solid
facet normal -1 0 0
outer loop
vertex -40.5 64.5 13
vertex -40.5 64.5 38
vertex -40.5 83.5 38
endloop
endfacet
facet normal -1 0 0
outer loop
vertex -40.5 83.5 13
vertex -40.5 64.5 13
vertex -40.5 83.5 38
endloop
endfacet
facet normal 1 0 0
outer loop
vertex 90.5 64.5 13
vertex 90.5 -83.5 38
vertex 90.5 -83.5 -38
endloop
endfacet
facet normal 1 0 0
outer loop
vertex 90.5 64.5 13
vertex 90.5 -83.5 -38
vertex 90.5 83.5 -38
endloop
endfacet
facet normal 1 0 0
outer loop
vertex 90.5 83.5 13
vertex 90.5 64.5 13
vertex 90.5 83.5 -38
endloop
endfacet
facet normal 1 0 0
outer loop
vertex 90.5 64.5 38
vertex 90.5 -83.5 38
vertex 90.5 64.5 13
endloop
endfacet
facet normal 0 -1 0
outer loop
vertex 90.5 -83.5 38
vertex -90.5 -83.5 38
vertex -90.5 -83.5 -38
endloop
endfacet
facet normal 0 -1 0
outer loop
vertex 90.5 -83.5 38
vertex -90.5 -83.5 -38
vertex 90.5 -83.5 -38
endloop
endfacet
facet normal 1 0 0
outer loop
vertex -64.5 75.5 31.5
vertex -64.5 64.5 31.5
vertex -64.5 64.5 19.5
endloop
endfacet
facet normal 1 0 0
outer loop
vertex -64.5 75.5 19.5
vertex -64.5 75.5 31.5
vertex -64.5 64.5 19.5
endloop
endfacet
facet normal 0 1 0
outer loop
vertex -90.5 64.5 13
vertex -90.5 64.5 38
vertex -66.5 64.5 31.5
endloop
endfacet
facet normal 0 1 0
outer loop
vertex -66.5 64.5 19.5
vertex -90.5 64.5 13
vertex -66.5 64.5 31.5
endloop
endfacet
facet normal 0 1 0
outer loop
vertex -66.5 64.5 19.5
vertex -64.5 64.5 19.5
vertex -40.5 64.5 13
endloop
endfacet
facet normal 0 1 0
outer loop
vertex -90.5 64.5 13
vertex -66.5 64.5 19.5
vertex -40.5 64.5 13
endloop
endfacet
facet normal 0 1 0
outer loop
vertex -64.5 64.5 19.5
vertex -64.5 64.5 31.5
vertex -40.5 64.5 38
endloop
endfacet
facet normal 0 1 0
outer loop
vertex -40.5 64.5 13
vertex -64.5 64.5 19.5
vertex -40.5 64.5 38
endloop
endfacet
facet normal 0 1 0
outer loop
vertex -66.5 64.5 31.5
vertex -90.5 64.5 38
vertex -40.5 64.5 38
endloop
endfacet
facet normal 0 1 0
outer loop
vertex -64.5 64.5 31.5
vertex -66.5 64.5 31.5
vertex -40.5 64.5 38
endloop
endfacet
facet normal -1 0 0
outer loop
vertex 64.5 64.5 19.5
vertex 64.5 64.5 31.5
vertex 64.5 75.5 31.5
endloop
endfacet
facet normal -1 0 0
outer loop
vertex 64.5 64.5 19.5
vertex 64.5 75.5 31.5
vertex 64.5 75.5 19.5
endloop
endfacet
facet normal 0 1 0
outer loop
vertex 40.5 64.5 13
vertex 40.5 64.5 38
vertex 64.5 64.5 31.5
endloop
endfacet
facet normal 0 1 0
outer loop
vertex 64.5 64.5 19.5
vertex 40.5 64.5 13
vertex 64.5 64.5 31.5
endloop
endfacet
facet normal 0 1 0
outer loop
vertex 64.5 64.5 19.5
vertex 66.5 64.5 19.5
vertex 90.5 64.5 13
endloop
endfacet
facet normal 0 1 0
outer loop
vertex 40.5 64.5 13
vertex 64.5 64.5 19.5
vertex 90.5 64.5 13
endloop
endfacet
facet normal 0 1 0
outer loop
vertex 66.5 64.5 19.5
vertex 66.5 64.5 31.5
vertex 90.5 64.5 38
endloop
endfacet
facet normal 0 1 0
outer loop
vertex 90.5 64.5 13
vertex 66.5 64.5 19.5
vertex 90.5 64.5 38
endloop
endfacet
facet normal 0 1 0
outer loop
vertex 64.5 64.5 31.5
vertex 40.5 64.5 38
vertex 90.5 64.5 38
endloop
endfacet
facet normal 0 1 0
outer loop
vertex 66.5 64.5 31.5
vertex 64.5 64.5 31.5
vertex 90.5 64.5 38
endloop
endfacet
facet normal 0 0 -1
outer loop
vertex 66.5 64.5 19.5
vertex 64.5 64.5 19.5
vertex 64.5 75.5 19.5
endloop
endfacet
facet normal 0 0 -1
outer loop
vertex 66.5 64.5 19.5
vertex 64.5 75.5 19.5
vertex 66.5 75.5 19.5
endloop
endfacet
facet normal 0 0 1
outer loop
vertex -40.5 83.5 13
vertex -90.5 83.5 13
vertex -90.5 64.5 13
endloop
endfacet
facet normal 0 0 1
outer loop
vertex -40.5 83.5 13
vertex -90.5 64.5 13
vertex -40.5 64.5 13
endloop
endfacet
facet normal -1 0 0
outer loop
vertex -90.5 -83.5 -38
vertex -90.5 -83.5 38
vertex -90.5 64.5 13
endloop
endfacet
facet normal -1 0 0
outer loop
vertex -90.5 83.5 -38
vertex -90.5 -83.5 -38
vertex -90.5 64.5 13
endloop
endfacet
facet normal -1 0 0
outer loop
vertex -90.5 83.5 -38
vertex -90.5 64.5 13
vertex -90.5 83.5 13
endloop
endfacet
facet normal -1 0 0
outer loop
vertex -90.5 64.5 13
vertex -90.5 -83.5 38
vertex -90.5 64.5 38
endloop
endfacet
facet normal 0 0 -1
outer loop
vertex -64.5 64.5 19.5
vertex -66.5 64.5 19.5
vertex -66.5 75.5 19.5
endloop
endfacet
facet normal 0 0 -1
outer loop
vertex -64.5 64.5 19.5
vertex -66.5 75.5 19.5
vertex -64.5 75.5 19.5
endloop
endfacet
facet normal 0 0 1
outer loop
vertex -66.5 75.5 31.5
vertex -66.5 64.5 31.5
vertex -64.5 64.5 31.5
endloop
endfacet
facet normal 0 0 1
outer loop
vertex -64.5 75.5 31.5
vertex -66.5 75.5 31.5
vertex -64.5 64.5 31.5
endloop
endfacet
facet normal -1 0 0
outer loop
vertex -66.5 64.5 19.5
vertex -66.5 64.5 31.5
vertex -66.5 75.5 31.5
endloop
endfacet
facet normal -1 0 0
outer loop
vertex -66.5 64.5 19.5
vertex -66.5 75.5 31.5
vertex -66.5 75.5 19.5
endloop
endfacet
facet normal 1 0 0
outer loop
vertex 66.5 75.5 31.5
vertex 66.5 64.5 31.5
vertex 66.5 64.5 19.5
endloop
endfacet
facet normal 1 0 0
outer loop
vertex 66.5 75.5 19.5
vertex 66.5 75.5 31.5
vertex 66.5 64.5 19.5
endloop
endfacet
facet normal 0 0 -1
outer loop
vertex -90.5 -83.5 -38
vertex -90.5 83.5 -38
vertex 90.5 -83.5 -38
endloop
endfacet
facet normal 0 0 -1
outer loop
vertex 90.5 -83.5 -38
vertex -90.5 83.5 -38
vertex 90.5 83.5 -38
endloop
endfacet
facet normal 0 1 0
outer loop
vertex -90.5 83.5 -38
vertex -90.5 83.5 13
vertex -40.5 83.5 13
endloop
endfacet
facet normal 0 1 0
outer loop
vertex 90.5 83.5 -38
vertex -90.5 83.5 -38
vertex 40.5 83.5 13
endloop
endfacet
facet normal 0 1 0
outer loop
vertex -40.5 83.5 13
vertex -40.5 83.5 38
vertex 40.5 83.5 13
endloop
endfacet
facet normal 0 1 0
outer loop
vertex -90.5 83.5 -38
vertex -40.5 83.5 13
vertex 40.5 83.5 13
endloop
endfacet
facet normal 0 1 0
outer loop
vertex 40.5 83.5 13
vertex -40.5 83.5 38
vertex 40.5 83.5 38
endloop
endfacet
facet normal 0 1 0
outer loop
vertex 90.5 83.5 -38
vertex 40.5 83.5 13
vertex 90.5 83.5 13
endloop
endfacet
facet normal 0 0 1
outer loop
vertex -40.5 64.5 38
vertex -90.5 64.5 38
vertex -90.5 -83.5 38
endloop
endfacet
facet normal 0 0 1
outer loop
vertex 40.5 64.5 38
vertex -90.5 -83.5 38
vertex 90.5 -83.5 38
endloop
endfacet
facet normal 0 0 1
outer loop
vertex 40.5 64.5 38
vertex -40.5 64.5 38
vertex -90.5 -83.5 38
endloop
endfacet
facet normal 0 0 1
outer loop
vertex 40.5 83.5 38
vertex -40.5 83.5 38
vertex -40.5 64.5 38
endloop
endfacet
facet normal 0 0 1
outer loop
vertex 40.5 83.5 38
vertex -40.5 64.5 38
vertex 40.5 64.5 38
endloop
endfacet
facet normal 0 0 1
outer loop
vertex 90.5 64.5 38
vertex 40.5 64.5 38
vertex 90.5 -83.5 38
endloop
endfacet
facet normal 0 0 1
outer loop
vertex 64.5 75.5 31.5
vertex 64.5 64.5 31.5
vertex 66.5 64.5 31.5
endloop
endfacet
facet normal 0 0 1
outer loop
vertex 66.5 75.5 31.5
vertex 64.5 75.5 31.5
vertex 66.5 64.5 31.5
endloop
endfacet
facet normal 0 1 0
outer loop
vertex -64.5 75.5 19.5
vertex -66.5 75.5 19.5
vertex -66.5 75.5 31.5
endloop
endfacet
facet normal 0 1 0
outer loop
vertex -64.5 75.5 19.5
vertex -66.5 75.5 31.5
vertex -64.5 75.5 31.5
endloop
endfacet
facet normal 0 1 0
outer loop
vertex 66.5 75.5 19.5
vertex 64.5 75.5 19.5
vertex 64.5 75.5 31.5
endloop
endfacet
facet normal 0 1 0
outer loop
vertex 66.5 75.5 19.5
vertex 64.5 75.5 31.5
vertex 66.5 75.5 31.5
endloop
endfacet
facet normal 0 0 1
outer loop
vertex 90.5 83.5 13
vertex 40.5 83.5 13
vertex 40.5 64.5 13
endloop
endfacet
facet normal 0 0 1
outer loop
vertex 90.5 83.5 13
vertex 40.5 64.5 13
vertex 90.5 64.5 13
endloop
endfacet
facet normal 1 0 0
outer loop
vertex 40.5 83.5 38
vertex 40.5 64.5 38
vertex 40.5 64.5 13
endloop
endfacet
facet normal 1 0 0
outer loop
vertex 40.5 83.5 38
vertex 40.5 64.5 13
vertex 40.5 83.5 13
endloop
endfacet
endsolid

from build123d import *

# Parameters (mm, degrees)
SKETCH1_W           = 181
SKETCH1_H           = 167
BOSS_EXTRUDE1_DEPTH = 38
SKETCH3_W           = 50
SKETCH3_H           = 19
CUT_EXTRUDE1_DEPTH  = 25
SKETCH4_W           = 2
SKETCH4_H           = 12
BOSS_EXTRUDE2_DEPTH = 11


with BuildPart() as part:
    # Sketch1 → Boss-Extrude1 (new body, symmetric)
    with BuildSketch(Plane.XY):
        Rectangle(SKETCH1_W, SKETCH1_H)
    extrude(amount=BOSS_EXTRUDE1_DEPTH, both=True)

    # Sketch3 → Cut-Extrude1 (cut)
    with BuildSketch(Plane.XY.offset(38)):
        with Locations((-65.5, 74)):
            Rectangle(SKETCH3_W, SKETCH3_H)
        with Locations((65.5, 74)):
            Rectangle(SKETCH3_W, SKETCH3_H)
    extrude(amount=-CUT_EXTRUDE1_DEPTH, mode=Mode.SUBTRACT)

    # Sketch4 → Boss-Extrude2 (add)
    with BuildSketch(Plane(origin=(0, 64.5, 0), x_dir=(1, 0, 0), z_dir=(0, 1, 0))):
        with Locations((-65.5, -25.5)):
            Rectangle(SKETCH4_W, SKETCH4_H)
        with Locations((65.5, -25.5)):
            Rectangle(SKETCH4_W, SKETCH4_H)
    extrude(amount=BOSS_EXTRUDE2_DEPTH)


solid = part.part
